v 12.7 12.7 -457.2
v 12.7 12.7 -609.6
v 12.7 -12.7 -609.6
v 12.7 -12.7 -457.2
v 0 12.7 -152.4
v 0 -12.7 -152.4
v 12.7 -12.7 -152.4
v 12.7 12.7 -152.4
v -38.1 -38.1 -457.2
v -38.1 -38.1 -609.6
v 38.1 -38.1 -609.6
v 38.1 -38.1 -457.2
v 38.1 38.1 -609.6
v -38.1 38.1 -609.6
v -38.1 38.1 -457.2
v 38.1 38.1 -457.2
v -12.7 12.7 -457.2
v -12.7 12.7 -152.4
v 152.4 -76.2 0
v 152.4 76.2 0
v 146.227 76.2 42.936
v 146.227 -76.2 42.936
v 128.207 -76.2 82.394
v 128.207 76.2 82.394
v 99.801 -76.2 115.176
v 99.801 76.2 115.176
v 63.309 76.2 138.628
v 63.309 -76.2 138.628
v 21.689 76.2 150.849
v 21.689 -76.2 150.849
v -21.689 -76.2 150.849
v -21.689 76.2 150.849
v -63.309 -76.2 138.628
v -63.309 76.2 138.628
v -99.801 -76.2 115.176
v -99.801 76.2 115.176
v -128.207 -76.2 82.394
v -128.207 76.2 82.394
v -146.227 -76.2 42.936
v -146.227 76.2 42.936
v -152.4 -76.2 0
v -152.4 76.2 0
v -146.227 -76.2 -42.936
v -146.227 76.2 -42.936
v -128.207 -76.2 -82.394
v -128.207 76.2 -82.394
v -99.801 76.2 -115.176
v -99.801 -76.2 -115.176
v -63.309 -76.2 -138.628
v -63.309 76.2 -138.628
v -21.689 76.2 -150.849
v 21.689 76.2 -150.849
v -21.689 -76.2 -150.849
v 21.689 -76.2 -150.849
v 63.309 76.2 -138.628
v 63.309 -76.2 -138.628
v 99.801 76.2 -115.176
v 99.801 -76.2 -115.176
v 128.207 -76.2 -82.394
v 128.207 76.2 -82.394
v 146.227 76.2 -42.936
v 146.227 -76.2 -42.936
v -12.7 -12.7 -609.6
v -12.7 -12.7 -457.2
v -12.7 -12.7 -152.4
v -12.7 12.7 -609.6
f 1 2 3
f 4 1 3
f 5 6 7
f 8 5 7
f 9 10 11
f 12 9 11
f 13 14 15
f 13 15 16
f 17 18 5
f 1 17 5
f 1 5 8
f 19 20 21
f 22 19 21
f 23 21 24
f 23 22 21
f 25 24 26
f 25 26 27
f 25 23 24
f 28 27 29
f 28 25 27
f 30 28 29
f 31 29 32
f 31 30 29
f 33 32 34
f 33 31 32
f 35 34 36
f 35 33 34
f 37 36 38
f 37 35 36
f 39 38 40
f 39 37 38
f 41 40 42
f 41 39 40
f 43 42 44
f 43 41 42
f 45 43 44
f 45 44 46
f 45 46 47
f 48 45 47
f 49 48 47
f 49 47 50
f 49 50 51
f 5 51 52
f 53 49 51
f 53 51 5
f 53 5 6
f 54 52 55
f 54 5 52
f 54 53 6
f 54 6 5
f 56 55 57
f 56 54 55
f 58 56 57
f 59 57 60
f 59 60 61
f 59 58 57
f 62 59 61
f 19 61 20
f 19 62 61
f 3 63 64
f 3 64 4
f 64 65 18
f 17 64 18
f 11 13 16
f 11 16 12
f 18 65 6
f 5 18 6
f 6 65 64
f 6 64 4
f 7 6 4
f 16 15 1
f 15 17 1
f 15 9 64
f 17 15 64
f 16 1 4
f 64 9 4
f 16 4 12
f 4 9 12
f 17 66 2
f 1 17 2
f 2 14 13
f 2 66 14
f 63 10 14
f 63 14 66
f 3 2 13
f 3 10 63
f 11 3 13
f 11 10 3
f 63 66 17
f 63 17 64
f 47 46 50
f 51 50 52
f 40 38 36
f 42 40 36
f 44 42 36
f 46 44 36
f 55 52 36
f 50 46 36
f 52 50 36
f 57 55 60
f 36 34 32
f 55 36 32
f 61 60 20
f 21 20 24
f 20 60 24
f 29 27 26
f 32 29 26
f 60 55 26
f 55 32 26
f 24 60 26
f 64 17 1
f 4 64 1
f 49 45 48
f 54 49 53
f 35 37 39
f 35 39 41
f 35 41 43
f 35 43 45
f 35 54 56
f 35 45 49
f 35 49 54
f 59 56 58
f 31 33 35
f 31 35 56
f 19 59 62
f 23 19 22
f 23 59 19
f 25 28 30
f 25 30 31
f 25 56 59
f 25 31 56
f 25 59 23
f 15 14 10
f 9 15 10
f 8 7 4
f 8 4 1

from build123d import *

# Parameters (mm, degrees)
F0_R     = 152.4
F1_DEPTH = 76.2
F3_W     = 25.4
F3_H     = 25.4
F4_DEPTH = 304.8
F5_W     = 76.2
F5_H     = 76.2
F5_W_2   = 25.4
F5_H_2   = 25.4
F6_DEPTH = 152.4


with BuildPart() as f1:
    # F0 (on Front) → F1 (new body, symmetric)
    with BuildSketch(Plane.XZ):
        Circle(F0_R)
    extrude(amount=F1_DEPTH, both=True)

    # F3 (on offset) → F4 (join)
    with BuildSketch(Plane.XY.offset(-152.4)):
        Rectangle(F3_W, F3_H)
    extrude(amount=-F4_DEPTH)


with BuildPart() as f6:
    # F5 (on face) → F6 (new body)
    with BuildSketch(Plane(origin=(0, 0, -457.2), x_dir=(1, 0, 0), z_dir=(0, 0, -1))):
        Rectangle(F5_W, F5_H)
        Rectangle(F5_W_2, F5_H_2, mode=Mode.SUBTRACT)
    extrude(amount=F6_DEPTH)


solid = Compound([f1.part, f6.part])
